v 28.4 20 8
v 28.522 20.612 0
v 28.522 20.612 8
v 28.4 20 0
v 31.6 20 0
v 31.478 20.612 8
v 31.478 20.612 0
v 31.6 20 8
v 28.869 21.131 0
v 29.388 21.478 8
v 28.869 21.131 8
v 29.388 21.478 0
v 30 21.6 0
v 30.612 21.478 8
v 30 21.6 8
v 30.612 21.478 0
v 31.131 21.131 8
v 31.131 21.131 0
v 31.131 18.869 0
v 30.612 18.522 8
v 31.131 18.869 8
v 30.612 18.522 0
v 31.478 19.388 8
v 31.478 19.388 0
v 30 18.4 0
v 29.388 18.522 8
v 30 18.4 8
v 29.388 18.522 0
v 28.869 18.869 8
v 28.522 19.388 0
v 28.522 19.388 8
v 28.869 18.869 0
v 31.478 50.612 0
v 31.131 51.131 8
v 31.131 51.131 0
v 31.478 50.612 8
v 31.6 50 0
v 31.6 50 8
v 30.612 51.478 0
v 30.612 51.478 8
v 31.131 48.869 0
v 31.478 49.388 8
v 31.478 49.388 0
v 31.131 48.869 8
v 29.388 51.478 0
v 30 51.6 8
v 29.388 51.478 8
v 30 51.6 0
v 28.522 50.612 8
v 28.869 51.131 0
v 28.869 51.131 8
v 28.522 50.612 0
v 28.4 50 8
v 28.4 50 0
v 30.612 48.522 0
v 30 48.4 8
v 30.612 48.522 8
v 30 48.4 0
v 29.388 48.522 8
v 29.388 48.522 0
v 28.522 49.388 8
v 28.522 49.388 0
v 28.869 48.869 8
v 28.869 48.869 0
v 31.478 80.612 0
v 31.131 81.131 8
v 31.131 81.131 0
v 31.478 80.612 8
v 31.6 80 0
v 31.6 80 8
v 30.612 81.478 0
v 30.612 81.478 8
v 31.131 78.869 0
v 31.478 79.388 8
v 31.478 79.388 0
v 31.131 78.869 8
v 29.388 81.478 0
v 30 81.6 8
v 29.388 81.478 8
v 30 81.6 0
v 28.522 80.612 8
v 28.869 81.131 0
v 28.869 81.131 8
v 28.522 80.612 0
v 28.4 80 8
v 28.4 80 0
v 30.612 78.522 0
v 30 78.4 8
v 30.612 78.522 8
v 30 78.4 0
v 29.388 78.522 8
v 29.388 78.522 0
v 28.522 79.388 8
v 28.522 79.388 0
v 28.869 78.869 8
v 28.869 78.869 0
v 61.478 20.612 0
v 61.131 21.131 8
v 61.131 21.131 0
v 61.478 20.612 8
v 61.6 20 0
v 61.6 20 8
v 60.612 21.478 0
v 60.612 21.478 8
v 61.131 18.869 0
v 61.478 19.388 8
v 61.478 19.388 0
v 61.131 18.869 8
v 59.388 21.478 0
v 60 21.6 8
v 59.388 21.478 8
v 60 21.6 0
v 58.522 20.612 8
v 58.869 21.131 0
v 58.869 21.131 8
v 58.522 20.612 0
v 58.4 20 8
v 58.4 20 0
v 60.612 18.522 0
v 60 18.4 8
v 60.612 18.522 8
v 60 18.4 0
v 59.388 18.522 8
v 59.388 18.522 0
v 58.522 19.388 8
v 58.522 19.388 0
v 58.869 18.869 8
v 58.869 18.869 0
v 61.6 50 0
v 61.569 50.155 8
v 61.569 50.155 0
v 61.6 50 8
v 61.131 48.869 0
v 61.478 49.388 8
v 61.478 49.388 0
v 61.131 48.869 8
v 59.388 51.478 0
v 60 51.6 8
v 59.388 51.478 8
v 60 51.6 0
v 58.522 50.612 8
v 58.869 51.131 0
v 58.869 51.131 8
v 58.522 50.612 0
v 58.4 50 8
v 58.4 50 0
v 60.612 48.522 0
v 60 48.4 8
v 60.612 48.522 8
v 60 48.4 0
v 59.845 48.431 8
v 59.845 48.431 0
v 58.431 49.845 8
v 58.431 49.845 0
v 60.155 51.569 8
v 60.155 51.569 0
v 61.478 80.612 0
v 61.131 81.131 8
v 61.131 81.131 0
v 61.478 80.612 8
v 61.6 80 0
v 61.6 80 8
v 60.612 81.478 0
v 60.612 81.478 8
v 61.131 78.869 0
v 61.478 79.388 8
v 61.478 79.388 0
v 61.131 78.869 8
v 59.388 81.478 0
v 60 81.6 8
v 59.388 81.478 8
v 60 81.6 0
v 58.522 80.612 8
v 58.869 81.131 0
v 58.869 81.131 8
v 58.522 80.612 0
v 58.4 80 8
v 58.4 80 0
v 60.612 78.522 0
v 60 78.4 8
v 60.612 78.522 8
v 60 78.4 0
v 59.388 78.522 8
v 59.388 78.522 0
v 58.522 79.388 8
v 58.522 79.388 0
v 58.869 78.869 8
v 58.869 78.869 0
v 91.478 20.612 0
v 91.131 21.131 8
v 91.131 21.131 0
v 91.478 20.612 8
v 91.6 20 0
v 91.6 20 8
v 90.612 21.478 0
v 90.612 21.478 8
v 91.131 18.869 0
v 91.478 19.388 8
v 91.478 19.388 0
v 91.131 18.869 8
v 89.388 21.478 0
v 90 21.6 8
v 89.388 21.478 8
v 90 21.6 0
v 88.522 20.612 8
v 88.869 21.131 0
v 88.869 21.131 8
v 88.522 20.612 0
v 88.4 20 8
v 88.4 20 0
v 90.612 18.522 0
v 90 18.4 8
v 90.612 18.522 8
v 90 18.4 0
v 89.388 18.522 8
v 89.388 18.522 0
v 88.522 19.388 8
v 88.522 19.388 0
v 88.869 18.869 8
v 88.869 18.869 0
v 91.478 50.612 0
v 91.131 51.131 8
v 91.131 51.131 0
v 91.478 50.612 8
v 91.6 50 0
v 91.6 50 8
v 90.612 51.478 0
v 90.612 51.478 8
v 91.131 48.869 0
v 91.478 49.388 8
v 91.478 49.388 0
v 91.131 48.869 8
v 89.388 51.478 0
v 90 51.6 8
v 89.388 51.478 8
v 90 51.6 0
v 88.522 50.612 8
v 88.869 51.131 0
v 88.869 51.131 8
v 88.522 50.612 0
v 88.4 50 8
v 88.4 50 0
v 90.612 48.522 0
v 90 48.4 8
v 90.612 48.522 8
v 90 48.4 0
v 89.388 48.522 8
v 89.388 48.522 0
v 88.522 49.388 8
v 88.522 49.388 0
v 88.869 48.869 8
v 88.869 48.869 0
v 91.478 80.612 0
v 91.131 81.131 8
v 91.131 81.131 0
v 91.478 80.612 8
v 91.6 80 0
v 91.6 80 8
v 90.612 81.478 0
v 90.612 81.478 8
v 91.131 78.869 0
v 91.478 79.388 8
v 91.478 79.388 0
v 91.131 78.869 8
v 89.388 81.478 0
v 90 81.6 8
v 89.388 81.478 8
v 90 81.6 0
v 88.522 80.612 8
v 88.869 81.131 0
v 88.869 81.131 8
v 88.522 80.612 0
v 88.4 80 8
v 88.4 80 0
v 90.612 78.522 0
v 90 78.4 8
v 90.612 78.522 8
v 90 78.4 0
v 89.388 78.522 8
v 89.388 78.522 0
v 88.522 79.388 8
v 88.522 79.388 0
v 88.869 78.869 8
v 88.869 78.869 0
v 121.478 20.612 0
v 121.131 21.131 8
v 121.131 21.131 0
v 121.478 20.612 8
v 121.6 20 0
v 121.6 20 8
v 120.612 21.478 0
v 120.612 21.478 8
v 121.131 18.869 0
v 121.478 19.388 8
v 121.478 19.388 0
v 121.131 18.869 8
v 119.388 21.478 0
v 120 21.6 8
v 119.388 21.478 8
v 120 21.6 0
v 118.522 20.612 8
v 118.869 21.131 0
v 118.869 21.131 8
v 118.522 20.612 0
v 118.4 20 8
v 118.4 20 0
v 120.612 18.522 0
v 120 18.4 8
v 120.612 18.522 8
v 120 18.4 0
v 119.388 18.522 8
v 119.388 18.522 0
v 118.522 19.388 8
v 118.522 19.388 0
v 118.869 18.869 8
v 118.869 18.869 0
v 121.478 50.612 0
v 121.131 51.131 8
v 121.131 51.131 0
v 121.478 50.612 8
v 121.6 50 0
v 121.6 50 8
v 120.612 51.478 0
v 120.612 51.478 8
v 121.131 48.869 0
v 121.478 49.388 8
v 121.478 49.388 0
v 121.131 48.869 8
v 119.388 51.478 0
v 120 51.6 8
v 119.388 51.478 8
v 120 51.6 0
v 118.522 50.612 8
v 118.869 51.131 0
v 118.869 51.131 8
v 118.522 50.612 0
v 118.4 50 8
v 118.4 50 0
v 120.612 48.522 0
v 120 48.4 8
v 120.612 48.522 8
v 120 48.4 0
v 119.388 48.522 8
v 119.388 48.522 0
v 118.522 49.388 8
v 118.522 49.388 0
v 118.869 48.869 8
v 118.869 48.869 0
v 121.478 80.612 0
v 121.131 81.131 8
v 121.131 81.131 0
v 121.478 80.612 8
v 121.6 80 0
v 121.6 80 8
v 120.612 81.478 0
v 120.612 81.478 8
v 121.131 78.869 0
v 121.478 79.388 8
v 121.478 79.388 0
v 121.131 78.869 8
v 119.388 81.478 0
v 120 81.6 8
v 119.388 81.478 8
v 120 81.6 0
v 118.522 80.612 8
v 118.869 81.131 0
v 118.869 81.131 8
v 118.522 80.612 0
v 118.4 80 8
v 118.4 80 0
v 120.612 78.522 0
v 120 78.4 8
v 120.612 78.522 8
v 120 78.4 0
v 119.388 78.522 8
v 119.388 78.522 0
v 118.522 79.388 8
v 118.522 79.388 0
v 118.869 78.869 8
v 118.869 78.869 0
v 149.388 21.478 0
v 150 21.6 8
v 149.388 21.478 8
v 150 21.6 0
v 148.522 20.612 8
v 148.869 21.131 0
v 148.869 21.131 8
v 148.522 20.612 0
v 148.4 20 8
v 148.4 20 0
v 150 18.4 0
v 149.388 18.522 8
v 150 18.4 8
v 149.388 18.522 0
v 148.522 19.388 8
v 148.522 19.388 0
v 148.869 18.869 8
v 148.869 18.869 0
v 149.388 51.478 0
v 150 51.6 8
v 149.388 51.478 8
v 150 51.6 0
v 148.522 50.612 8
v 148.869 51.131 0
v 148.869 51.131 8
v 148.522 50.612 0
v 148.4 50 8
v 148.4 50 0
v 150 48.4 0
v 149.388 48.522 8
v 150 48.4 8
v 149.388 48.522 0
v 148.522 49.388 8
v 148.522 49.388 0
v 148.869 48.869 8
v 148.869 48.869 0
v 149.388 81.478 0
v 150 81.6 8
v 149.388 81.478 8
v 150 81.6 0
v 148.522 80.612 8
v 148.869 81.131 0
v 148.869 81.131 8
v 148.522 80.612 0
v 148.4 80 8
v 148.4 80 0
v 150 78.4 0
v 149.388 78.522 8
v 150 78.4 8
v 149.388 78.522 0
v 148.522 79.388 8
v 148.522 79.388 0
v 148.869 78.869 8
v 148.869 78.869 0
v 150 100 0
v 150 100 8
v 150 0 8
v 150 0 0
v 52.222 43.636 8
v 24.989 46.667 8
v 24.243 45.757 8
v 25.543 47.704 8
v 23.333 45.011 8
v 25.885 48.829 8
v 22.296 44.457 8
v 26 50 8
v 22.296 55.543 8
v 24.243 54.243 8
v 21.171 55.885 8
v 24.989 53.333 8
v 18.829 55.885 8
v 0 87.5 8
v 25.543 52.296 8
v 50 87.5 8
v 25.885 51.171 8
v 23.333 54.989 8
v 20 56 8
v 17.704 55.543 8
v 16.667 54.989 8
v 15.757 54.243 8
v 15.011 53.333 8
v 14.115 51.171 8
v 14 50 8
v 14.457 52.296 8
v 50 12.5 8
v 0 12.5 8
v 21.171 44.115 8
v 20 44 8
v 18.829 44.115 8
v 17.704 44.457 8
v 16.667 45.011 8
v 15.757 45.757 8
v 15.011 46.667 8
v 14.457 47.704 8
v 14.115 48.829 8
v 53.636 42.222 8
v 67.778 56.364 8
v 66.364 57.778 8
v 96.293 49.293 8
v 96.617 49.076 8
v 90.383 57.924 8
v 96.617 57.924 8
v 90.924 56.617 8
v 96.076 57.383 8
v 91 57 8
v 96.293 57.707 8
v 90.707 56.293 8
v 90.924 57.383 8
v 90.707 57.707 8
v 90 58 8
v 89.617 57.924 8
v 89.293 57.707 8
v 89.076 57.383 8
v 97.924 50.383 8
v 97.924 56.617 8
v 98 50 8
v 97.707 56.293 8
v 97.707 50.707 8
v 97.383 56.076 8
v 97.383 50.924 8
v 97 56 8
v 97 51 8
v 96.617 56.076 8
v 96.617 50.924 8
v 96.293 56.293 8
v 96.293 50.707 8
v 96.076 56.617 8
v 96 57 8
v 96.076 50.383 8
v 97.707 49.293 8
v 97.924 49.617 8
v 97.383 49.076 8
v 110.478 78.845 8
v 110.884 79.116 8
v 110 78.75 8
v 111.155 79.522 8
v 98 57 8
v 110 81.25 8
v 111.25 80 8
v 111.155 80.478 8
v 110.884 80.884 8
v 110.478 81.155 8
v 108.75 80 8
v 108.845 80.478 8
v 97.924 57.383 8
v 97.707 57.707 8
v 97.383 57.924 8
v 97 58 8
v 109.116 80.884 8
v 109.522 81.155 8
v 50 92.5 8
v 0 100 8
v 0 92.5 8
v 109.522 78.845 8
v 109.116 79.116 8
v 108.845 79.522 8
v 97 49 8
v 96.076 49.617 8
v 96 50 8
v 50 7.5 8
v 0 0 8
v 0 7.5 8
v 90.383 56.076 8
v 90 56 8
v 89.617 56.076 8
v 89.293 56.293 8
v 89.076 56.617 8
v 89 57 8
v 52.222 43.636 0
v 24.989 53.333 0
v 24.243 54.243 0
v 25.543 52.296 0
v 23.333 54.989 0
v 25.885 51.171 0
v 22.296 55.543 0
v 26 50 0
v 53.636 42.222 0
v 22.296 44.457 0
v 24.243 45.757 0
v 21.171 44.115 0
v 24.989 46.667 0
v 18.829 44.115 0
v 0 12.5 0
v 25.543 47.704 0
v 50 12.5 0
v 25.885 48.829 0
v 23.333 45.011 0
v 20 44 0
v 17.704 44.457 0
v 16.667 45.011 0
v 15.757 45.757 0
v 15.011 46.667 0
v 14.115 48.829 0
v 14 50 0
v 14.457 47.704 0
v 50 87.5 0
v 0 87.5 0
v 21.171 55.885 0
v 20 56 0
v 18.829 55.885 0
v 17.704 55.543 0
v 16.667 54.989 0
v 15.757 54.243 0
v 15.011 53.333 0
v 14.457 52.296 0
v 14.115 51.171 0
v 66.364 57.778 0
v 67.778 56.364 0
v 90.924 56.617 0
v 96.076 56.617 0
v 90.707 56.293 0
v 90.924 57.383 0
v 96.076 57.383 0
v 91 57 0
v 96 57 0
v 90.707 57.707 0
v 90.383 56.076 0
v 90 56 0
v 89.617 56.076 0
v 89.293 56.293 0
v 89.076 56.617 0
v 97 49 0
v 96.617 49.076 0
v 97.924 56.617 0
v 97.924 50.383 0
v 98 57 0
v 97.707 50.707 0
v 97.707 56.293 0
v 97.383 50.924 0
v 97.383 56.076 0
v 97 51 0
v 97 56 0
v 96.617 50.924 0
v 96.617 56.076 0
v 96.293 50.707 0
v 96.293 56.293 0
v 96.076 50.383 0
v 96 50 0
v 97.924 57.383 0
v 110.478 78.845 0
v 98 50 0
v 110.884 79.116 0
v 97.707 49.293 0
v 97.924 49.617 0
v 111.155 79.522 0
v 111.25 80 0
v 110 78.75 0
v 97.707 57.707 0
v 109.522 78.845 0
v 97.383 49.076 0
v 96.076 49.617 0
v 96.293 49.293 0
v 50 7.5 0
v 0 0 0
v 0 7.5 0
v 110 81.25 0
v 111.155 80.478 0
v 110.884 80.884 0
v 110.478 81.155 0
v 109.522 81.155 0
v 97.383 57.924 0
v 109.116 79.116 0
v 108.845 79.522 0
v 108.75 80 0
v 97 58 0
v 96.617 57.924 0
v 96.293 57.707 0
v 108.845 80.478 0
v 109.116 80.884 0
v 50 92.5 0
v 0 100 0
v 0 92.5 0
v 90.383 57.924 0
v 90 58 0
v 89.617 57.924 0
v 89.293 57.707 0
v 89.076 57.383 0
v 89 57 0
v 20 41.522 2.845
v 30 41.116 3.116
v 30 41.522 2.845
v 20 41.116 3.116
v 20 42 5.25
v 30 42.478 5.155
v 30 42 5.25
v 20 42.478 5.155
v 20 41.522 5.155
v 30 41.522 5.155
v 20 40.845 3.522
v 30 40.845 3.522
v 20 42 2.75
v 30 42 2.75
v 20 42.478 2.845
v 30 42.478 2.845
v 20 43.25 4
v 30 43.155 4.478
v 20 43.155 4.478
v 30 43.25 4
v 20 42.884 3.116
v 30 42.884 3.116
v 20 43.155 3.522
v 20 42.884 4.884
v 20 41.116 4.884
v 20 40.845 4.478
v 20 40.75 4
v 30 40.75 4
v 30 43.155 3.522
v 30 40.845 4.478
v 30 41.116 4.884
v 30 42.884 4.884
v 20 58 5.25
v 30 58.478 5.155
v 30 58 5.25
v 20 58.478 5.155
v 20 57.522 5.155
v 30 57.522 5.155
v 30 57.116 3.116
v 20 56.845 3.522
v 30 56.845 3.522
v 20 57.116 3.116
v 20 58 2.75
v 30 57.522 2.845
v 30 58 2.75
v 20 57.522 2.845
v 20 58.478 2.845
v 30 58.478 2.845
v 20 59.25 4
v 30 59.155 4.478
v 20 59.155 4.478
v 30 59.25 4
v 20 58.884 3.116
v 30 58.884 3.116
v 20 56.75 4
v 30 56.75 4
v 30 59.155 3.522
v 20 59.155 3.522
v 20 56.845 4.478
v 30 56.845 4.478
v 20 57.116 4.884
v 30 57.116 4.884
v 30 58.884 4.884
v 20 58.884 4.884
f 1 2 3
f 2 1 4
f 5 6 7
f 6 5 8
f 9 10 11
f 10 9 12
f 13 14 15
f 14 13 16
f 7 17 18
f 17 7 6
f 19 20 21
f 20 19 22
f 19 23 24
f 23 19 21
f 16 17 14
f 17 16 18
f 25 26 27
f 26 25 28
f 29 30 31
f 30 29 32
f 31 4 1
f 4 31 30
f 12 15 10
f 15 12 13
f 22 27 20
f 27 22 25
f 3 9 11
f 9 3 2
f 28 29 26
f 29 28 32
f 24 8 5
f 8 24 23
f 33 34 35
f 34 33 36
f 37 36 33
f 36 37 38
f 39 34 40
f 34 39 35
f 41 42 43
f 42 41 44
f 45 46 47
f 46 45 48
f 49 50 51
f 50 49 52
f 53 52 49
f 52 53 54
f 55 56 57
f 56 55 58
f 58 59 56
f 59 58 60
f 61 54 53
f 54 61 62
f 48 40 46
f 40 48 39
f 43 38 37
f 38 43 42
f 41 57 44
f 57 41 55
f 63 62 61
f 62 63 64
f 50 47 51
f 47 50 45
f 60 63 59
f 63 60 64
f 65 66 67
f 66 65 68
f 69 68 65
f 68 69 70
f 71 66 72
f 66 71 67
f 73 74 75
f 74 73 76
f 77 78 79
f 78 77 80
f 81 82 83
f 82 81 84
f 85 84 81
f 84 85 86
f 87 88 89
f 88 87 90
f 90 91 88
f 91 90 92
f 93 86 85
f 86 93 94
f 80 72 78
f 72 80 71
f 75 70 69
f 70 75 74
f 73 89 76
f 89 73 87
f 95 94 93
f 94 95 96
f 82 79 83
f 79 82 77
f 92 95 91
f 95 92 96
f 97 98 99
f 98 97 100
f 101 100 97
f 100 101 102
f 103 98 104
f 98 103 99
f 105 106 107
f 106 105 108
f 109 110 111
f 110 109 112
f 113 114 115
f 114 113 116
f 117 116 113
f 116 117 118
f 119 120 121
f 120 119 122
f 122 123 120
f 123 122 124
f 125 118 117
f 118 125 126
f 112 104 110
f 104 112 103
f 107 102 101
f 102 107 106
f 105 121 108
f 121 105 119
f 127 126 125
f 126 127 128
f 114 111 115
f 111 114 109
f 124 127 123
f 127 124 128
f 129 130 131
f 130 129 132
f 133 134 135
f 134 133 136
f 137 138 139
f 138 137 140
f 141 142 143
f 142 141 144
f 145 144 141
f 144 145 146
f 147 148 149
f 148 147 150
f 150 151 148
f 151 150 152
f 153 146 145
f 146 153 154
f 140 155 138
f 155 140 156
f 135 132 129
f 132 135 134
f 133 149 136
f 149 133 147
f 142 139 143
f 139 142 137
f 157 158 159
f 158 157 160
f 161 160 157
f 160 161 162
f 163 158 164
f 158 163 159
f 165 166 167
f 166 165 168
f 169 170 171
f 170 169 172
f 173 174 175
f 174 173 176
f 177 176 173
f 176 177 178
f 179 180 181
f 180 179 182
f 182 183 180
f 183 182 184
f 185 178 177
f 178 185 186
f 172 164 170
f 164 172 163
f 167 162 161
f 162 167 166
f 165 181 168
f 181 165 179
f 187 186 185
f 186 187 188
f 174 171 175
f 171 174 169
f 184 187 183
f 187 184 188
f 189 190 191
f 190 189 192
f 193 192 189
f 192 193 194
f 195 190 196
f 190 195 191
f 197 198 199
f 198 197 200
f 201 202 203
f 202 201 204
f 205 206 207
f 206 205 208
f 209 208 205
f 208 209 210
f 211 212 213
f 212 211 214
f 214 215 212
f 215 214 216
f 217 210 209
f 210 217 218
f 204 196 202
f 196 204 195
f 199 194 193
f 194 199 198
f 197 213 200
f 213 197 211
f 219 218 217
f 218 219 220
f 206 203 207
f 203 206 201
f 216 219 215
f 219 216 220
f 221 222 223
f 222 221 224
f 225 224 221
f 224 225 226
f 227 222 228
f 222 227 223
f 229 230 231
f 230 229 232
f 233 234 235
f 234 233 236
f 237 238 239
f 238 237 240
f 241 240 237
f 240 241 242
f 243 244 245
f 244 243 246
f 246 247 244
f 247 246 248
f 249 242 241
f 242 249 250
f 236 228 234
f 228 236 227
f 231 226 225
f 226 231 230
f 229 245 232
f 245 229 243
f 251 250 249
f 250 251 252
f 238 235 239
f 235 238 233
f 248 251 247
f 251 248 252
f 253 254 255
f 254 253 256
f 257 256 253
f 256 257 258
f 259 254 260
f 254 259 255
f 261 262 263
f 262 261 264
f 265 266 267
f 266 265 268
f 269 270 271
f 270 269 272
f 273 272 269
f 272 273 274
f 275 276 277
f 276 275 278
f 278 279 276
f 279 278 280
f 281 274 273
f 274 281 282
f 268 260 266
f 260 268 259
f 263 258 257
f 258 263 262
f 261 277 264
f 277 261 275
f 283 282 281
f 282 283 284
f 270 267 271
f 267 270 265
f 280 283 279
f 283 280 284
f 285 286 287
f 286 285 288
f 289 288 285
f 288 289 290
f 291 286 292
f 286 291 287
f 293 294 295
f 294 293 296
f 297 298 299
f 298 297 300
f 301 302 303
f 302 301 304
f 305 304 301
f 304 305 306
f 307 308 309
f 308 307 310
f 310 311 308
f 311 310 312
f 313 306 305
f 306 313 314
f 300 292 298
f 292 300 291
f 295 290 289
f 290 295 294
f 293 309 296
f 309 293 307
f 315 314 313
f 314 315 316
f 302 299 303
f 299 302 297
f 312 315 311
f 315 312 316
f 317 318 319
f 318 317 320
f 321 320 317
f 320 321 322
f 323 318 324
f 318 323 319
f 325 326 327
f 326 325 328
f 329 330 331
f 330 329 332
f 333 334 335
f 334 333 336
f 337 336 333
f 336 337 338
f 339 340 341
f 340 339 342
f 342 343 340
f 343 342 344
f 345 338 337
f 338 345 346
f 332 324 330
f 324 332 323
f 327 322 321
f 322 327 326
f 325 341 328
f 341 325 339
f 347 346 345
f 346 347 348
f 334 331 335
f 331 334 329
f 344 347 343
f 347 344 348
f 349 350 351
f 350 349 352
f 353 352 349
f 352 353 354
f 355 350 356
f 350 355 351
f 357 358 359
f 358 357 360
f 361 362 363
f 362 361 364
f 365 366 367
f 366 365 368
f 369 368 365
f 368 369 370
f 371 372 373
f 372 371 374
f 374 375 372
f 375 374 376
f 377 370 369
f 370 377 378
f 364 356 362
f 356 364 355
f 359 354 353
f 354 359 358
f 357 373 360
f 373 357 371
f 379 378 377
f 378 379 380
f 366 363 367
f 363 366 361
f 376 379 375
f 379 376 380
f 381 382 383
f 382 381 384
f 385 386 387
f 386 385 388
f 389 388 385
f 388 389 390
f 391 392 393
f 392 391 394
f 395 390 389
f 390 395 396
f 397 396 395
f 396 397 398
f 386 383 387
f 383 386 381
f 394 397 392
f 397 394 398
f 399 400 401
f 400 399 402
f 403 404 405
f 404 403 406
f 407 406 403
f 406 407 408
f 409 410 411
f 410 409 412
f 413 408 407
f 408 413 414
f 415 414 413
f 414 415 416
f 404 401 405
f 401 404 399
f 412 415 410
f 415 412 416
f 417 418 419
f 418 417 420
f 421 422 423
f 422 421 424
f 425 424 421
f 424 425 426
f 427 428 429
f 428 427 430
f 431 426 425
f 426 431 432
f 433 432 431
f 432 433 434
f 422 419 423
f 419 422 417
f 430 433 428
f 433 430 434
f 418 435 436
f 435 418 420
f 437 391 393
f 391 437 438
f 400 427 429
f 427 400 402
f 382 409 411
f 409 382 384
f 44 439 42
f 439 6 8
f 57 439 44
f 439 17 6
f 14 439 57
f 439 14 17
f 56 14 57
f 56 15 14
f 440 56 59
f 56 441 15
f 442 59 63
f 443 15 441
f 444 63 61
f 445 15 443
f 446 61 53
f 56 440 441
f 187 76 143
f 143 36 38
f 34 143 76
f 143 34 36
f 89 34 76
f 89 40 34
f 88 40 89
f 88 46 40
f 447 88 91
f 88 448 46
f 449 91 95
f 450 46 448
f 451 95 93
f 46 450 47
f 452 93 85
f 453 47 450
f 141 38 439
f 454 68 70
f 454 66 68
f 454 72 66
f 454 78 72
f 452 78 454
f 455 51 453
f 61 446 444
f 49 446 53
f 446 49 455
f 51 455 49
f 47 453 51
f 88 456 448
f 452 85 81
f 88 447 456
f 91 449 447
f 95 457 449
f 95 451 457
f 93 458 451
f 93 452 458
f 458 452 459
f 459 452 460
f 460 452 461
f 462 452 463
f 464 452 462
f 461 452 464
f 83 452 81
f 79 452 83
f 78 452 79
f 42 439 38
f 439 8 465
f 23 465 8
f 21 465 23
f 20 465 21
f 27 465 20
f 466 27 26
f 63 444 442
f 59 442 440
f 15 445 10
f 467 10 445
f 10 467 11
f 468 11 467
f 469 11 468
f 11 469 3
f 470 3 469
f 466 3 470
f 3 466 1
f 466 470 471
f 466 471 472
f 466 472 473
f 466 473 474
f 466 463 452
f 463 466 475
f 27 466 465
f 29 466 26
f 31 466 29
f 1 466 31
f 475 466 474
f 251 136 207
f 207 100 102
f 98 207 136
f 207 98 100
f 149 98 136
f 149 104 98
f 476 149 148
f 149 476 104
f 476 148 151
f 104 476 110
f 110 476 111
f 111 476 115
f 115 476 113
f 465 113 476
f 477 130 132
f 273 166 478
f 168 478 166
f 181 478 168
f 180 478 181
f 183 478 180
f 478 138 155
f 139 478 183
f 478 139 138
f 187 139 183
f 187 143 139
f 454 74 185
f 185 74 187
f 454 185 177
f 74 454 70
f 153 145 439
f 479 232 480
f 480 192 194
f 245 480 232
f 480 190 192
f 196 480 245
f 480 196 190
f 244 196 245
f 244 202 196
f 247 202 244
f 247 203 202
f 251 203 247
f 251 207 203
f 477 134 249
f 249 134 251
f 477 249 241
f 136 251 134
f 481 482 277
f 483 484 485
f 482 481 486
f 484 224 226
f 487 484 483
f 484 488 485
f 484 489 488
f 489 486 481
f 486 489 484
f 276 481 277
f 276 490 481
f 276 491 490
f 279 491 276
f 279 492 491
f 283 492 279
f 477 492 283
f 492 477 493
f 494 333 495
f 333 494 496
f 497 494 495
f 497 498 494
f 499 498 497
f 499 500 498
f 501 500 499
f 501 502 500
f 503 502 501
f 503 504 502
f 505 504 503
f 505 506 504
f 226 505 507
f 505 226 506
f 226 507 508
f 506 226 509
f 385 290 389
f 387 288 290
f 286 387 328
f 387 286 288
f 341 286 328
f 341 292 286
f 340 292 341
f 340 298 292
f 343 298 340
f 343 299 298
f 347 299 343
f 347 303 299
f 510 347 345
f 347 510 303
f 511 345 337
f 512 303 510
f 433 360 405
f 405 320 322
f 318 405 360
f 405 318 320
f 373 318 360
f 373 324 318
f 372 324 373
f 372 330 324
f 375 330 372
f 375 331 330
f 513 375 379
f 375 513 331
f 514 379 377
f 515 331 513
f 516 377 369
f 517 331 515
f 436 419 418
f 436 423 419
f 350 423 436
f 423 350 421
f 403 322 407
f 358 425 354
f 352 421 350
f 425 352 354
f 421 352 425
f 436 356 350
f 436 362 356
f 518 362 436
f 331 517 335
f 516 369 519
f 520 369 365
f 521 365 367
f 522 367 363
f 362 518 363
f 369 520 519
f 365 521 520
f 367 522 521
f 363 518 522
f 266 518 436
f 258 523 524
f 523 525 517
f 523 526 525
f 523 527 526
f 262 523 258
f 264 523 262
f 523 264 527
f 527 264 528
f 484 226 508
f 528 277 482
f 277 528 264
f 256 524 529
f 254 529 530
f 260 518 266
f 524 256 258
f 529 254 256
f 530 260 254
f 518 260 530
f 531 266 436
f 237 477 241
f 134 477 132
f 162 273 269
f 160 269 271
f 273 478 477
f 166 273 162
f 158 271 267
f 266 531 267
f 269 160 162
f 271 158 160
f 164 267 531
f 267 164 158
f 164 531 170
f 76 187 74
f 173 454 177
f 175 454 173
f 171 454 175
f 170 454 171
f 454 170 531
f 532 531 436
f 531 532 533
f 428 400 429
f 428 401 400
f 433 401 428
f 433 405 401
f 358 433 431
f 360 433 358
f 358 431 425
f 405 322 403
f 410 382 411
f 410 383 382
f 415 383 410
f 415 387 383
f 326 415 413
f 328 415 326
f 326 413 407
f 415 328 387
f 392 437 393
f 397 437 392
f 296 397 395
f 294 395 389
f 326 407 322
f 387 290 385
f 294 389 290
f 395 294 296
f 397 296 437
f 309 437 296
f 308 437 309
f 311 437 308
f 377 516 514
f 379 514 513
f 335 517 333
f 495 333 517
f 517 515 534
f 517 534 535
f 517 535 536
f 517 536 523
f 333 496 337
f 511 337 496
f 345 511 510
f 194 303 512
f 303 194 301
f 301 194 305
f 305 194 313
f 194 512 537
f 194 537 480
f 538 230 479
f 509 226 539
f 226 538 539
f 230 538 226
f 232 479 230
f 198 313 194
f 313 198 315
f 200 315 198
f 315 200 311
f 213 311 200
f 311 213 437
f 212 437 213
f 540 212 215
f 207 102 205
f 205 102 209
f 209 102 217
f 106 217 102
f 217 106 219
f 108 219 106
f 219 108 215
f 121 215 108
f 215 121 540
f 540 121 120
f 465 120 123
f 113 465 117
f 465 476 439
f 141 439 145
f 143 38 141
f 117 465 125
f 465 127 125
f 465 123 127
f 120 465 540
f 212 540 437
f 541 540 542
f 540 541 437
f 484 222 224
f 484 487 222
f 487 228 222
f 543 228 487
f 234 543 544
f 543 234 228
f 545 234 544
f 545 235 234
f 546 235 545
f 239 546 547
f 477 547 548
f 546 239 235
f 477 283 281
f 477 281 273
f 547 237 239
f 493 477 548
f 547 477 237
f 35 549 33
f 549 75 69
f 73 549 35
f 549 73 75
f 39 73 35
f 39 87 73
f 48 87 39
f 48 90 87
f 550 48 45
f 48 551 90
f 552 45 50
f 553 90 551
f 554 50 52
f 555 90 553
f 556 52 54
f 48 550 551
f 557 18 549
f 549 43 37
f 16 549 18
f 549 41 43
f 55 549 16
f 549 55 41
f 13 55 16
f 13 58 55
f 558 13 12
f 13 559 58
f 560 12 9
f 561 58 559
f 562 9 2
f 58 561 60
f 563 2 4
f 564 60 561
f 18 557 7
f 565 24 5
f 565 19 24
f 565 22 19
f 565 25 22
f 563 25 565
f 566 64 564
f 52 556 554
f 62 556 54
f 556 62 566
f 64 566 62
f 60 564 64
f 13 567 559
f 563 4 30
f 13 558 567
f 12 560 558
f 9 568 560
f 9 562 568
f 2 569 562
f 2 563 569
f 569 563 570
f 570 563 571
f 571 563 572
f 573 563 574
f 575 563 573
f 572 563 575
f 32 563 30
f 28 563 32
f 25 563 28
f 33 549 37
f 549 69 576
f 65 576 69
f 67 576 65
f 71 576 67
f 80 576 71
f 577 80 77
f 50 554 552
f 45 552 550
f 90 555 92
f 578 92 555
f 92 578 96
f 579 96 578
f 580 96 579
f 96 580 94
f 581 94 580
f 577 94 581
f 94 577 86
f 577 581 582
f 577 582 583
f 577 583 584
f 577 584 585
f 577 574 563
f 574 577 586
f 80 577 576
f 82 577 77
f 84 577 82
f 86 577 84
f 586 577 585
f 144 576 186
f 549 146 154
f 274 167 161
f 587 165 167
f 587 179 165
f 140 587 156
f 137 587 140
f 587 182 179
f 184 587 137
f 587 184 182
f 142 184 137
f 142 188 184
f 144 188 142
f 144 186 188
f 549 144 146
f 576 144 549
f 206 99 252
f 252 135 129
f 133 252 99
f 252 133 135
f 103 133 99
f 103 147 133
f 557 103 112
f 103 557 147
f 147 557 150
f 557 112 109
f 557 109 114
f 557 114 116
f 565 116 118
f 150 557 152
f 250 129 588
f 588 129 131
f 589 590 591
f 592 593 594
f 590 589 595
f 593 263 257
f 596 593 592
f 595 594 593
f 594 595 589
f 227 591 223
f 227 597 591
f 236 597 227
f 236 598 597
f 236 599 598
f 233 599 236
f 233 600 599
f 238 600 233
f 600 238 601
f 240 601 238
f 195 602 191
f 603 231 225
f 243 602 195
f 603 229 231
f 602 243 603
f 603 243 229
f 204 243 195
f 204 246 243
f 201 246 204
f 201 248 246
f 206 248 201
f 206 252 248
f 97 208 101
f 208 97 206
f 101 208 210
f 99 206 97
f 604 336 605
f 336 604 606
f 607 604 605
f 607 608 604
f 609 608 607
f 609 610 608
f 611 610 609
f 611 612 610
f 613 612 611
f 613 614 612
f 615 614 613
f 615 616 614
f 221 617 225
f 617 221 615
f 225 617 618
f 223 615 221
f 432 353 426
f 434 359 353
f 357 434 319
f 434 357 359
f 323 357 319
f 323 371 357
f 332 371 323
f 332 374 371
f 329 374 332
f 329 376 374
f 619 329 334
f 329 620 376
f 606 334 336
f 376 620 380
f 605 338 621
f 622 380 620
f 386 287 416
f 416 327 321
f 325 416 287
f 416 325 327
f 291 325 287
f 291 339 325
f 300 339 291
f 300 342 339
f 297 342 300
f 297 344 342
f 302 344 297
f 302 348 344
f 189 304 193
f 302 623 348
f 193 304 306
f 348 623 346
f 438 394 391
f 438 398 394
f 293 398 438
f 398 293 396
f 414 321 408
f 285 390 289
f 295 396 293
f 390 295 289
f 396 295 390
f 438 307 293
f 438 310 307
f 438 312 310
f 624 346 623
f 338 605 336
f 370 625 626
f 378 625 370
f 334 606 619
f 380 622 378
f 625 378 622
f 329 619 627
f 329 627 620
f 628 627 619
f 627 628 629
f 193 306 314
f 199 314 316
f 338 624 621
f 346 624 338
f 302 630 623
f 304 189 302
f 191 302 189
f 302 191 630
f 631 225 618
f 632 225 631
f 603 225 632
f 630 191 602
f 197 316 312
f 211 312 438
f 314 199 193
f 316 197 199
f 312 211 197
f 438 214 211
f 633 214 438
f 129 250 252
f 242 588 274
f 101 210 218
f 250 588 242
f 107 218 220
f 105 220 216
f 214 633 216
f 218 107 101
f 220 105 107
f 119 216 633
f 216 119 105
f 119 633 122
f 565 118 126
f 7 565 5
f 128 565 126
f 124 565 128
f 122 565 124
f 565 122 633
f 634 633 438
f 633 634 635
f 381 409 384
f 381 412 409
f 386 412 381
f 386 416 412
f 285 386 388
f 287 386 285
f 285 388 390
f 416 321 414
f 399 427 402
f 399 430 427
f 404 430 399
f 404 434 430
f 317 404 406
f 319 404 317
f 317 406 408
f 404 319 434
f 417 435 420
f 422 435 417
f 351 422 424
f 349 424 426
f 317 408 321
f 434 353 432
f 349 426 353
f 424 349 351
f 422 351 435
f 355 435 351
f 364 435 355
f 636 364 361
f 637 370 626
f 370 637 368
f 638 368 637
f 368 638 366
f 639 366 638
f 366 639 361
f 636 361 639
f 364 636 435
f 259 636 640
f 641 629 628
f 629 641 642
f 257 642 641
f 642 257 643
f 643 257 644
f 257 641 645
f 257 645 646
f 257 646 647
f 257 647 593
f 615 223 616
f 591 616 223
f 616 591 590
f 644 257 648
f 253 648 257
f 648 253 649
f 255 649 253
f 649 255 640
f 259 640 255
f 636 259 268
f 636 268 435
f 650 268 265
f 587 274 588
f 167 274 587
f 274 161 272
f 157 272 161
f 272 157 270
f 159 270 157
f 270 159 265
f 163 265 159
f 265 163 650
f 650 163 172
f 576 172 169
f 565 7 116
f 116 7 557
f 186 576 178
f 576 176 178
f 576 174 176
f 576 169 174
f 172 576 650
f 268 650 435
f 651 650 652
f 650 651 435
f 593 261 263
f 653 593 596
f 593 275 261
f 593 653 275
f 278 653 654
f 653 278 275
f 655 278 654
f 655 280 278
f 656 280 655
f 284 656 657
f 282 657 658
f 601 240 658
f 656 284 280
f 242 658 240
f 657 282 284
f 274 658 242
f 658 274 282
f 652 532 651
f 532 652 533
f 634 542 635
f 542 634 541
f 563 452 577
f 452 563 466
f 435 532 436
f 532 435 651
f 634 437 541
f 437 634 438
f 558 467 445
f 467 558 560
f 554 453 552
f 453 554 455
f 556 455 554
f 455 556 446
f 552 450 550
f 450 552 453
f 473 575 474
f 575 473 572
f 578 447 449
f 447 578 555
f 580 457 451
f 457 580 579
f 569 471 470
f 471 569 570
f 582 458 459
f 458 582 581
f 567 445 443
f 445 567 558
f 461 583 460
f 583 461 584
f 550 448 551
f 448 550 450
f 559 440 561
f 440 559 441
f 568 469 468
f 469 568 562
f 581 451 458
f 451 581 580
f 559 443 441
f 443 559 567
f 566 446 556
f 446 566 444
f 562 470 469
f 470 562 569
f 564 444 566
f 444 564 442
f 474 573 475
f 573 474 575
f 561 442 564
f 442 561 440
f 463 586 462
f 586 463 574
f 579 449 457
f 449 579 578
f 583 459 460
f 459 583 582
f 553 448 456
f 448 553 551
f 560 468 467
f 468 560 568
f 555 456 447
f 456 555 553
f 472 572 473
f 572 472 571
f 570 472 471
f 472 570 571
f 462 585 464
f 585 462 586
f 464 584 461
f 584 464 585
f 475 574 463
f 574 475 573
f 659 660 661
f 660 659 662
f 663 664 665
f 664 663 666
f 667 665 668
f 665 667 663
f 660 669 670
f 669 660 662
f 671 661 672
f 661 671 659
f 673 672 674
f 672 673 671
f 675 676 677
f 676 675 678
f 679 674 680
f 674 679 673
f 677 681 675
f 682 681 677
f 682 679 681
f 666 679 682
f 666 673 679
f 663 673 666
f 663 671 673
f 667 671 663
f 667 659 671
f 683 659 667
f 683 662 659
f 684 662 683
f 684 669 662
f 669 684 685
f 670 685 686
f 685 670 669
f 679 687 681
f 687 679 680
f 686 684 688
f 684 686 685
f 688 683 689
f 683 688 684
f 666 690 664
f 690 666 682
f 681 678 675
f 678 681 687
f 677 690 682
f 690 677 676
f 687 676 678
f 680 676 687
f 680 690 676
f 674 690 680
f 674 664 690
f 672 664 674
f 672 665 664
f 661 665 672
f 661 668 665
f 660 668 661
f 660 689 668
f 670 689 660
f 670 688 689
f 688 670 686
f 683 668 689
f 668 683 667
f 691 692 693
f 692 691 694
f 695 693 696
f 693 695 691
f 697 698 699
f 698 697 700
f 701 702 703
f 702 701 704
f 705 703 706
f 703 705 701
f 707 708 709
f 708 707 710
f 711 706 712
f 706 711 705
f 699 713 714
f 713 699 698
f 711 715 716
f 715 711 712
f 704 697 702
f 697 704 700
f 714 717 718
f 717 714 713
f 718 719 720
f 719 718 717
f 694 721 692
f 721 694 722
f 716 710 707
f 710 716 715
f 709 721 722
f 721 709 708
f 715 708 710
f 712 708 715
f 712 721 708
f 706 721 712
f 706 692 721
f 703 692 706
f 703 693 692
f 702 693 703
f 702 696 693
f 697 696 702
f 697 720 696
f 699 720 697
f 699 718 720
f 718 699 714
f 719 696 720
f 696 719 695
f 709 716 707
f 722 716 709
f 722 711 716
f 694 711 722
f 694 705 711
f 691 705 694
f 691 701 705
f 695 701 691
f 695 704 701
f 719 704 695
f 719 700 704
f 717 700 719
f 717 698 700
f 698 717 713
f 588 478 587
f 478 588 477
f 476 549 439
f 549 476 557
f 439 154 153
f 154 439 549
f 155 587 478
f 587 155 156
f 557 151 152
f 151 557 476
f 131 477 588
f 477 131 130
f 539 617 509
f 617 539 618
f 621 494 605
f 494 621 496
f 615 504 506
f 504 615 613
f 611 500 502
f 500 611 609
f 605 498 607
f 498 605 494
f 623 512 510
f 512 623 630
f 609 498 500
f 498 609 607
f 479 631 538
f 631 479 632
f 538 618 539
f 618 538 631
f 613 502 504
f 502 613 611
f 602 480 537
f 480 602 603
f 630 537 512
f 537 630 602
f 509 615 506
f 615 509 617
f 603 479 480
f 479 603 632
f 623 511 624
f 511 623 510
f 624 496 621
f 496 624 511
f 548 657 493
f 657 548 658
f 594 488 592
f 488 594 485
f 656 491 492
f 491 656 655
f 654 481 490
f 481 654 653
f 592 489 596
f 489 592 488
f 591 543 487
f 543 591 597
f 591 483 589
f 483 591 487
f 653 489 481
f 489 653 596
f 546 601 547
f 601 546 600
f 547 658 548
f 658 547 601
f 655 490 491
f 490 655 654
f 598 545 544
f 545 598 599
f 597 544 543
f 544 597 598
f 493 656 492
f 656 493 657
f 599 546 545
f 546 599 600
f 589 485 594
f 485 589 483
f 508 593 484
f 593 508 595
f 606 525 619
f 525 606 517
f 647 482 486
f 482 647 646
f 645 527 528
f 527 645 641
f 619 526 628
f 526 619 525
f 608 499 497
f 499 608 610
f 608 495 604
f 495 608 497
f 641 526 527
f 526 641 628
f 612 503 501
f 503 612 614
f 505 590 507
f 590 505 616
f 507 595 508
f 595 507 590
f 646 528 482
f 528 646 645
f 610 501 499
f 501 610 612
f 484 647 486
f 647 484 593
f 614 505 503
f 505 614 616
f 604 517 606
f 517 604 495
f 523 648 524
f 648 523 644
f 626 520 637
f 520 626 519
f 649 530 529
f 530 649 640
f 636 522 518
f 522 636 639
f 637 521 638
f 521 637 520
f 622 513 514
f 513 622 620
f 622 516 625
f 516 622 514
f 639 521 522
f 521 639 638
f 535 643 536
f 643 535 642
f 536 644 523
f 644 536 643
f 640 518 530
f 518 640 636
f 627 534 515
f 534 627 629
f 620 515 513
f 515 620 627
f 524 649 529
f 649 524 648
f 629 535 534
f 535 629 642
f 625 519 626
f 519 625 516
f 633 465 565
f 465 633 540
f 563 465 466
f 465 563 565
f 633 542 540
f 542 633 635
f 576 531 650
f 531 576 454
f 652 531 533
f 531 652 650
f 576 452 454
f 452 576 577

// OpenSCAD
// Optical Base Plate for NV Sensor
// Mounts laser, optics, and detector
// Compatible with 30mm cage system or standalone

// Base plate dimensions
base_x = 150;
base_y = 100;
base_z = 8;

// Mounting hole spacing (standard 30mm cage)
hole_spacing = 30;
hole_d = 3.2;  // M3 screw

// Laser mount position
laser_x = 20;
laser_y = 50;
laser_d = 12;  // Laser module diameter

// Dichroic mount position
dichroic_x = 60;
dichroic_y = 50;
dichroic_angle = 45;

// Diamond holder position
diamond_x = 90;
diamond_y = 50;

// Detector position
detector_x = 90;
detector_y = 80;

module base_plate() {
    difference() {
        // Main plate
        cube([base_x, base_y, base_z], center=false);
        
        // Cage system mounting holes (3x3 grid)
        for(i=[0:4]) {
            for(j=[0:2]) {
                x = 30 + i*hole_spacing;
                y = 20 + j*hole_spacing;
                translate([x, y, -0.1])
                    cylinder(d=hole_d, h=base_z + 0.2, $fn=16);
            }
        }
        
        // Laser mounting hole
        translate([laser_x, laser_y, -0.1])
            cylinder(d=laser_d, h=base_z + 0.2, $fn=32);
        
        // Laser set screw holes
        translate([laser_x, laser_y - laser_d/2 - 2, base_z/2])
            rotate([0, 90, 0])
                cylinder(d=2.5, h=10, $fn=16);
        translate([laser_x, laser_y + laser_d/2 + 2, base_z/2])
            rotate([0, 90, 0])
                cylinder(d=2.5, h=10, $fn=16);
        
        // Dichroic mount slot (45 degrees)
        translate([dichroic_x, dichroic_y, base_z/2])
            rotate([0, 0, dichroic_angle])
                cube([20, 2, base_z + 0.2], center=true);
        
        // Diamond holder mounting holes
        translate([diamond_x, diamond_y, -0.1])
            cylinder(d=2, h=base_z + 0.2, $fn=16);
        translate([diamond_x + 7, diamond_y, -0.1])
            cylinder(d=2, h=base_z + 0.2, $fn=16);
        translate([diamond_x, diamond_y + 7, -0.1])
            cylinder(d=2, h=base_z + 0.2, $fn=16);
        translate([diamond_x + 7, diamond_y + 7, -0.1])
            cylinder(d=2, h=base_z + 0.2, $fn=16);
        
        // Detector mounting holes
        translate([detector_x, detector_y, -0.1])
            cylinder(d=2.5, h=base_z + 0.2, $fn=16);
        translate([detector_x + 20, detector_y, -0.1])
            cylinder(d=2.5, h=base_z + 0.2, $fn=16);
        
        // Cable management slots
        translate([10, 10, base_z/2])
            cube([80, 5, base_z + 0.2], center=true);
        translate([10, base_y - 10, base_z/2])
            cube([80, 5, base_z + 0.2], center=true);
    }
}

module laser_mount() {
    // Adjustable laser mount
    mount_h = 20;
    
    difference() {
        union() {
            // Base
            cube([25, 25, 8], center=true);
            // Tower
            translate([0, 0, mount_h/2])
                cube([20, 20, mount_h], center=true);
        }
        
        // Laser hole
        translate([0, 0, mount_h/2])
            rotate([90, 0, 0])
                cylinder(d=12.5, h=25, $fn=32);
        
        // Adjustment screw
        translate([0, 0, mount_h - 5])
            rotate([90, 0, 0])
                cylinder(d=3, h=25, $fn=16);
        
        // Mounting holes
        translate([-8, -8, -4.1])
            cylinder(d=3.2, h=8.2, $fn=16);
        translate([8, -8, -4.1])
            cylinder(d=3.2, h=8.2, $fn=16);
        translate([-8, 8, -4.1])
            cylinder(d=3.2, h=8.2, $fn=16);
        translate([8, 8, -4.1])
            cylinder(d=3.2, h=8.2, $fn=16);
    }
}

module dichroic_mount() {
    // 45 degree dichroic mirror mount
    mirror_size = 25.4;  // 1 inch
    
    difference() {
        union() {
            // Base
            cube([30, 30, 8], center=true);
            // Mirror holder at 45 degrees
            rotate([0, 0, 45])
                translate([0, 0, 15])
                    cube([mirror_size + 4, mirror_size + 4, 4], center=true);
        }
        
        // Mirror slot
        rotate([0, 0, 45])
            translate([0, 0, 15])
                cube([mirror_size + 0.5, mirror_size + 0.5, 5], center=true);
        
        // Light path hole
        rotate([0, 0, 45])
            translate([0, 0, 15])
                cylinder(d=20, h=10, $fn=32);
        
        // Mounting holes
        for(i=[0:3]) {
            rotate([0, 0, i*90])
                translate([10, 10, -4.1])
                    cylinder(d=3.2, h=8.2, $fn=16);
        }
    }
}

// Export for printing
base_plate();
// laser_mount();
// dichroic_mount();
